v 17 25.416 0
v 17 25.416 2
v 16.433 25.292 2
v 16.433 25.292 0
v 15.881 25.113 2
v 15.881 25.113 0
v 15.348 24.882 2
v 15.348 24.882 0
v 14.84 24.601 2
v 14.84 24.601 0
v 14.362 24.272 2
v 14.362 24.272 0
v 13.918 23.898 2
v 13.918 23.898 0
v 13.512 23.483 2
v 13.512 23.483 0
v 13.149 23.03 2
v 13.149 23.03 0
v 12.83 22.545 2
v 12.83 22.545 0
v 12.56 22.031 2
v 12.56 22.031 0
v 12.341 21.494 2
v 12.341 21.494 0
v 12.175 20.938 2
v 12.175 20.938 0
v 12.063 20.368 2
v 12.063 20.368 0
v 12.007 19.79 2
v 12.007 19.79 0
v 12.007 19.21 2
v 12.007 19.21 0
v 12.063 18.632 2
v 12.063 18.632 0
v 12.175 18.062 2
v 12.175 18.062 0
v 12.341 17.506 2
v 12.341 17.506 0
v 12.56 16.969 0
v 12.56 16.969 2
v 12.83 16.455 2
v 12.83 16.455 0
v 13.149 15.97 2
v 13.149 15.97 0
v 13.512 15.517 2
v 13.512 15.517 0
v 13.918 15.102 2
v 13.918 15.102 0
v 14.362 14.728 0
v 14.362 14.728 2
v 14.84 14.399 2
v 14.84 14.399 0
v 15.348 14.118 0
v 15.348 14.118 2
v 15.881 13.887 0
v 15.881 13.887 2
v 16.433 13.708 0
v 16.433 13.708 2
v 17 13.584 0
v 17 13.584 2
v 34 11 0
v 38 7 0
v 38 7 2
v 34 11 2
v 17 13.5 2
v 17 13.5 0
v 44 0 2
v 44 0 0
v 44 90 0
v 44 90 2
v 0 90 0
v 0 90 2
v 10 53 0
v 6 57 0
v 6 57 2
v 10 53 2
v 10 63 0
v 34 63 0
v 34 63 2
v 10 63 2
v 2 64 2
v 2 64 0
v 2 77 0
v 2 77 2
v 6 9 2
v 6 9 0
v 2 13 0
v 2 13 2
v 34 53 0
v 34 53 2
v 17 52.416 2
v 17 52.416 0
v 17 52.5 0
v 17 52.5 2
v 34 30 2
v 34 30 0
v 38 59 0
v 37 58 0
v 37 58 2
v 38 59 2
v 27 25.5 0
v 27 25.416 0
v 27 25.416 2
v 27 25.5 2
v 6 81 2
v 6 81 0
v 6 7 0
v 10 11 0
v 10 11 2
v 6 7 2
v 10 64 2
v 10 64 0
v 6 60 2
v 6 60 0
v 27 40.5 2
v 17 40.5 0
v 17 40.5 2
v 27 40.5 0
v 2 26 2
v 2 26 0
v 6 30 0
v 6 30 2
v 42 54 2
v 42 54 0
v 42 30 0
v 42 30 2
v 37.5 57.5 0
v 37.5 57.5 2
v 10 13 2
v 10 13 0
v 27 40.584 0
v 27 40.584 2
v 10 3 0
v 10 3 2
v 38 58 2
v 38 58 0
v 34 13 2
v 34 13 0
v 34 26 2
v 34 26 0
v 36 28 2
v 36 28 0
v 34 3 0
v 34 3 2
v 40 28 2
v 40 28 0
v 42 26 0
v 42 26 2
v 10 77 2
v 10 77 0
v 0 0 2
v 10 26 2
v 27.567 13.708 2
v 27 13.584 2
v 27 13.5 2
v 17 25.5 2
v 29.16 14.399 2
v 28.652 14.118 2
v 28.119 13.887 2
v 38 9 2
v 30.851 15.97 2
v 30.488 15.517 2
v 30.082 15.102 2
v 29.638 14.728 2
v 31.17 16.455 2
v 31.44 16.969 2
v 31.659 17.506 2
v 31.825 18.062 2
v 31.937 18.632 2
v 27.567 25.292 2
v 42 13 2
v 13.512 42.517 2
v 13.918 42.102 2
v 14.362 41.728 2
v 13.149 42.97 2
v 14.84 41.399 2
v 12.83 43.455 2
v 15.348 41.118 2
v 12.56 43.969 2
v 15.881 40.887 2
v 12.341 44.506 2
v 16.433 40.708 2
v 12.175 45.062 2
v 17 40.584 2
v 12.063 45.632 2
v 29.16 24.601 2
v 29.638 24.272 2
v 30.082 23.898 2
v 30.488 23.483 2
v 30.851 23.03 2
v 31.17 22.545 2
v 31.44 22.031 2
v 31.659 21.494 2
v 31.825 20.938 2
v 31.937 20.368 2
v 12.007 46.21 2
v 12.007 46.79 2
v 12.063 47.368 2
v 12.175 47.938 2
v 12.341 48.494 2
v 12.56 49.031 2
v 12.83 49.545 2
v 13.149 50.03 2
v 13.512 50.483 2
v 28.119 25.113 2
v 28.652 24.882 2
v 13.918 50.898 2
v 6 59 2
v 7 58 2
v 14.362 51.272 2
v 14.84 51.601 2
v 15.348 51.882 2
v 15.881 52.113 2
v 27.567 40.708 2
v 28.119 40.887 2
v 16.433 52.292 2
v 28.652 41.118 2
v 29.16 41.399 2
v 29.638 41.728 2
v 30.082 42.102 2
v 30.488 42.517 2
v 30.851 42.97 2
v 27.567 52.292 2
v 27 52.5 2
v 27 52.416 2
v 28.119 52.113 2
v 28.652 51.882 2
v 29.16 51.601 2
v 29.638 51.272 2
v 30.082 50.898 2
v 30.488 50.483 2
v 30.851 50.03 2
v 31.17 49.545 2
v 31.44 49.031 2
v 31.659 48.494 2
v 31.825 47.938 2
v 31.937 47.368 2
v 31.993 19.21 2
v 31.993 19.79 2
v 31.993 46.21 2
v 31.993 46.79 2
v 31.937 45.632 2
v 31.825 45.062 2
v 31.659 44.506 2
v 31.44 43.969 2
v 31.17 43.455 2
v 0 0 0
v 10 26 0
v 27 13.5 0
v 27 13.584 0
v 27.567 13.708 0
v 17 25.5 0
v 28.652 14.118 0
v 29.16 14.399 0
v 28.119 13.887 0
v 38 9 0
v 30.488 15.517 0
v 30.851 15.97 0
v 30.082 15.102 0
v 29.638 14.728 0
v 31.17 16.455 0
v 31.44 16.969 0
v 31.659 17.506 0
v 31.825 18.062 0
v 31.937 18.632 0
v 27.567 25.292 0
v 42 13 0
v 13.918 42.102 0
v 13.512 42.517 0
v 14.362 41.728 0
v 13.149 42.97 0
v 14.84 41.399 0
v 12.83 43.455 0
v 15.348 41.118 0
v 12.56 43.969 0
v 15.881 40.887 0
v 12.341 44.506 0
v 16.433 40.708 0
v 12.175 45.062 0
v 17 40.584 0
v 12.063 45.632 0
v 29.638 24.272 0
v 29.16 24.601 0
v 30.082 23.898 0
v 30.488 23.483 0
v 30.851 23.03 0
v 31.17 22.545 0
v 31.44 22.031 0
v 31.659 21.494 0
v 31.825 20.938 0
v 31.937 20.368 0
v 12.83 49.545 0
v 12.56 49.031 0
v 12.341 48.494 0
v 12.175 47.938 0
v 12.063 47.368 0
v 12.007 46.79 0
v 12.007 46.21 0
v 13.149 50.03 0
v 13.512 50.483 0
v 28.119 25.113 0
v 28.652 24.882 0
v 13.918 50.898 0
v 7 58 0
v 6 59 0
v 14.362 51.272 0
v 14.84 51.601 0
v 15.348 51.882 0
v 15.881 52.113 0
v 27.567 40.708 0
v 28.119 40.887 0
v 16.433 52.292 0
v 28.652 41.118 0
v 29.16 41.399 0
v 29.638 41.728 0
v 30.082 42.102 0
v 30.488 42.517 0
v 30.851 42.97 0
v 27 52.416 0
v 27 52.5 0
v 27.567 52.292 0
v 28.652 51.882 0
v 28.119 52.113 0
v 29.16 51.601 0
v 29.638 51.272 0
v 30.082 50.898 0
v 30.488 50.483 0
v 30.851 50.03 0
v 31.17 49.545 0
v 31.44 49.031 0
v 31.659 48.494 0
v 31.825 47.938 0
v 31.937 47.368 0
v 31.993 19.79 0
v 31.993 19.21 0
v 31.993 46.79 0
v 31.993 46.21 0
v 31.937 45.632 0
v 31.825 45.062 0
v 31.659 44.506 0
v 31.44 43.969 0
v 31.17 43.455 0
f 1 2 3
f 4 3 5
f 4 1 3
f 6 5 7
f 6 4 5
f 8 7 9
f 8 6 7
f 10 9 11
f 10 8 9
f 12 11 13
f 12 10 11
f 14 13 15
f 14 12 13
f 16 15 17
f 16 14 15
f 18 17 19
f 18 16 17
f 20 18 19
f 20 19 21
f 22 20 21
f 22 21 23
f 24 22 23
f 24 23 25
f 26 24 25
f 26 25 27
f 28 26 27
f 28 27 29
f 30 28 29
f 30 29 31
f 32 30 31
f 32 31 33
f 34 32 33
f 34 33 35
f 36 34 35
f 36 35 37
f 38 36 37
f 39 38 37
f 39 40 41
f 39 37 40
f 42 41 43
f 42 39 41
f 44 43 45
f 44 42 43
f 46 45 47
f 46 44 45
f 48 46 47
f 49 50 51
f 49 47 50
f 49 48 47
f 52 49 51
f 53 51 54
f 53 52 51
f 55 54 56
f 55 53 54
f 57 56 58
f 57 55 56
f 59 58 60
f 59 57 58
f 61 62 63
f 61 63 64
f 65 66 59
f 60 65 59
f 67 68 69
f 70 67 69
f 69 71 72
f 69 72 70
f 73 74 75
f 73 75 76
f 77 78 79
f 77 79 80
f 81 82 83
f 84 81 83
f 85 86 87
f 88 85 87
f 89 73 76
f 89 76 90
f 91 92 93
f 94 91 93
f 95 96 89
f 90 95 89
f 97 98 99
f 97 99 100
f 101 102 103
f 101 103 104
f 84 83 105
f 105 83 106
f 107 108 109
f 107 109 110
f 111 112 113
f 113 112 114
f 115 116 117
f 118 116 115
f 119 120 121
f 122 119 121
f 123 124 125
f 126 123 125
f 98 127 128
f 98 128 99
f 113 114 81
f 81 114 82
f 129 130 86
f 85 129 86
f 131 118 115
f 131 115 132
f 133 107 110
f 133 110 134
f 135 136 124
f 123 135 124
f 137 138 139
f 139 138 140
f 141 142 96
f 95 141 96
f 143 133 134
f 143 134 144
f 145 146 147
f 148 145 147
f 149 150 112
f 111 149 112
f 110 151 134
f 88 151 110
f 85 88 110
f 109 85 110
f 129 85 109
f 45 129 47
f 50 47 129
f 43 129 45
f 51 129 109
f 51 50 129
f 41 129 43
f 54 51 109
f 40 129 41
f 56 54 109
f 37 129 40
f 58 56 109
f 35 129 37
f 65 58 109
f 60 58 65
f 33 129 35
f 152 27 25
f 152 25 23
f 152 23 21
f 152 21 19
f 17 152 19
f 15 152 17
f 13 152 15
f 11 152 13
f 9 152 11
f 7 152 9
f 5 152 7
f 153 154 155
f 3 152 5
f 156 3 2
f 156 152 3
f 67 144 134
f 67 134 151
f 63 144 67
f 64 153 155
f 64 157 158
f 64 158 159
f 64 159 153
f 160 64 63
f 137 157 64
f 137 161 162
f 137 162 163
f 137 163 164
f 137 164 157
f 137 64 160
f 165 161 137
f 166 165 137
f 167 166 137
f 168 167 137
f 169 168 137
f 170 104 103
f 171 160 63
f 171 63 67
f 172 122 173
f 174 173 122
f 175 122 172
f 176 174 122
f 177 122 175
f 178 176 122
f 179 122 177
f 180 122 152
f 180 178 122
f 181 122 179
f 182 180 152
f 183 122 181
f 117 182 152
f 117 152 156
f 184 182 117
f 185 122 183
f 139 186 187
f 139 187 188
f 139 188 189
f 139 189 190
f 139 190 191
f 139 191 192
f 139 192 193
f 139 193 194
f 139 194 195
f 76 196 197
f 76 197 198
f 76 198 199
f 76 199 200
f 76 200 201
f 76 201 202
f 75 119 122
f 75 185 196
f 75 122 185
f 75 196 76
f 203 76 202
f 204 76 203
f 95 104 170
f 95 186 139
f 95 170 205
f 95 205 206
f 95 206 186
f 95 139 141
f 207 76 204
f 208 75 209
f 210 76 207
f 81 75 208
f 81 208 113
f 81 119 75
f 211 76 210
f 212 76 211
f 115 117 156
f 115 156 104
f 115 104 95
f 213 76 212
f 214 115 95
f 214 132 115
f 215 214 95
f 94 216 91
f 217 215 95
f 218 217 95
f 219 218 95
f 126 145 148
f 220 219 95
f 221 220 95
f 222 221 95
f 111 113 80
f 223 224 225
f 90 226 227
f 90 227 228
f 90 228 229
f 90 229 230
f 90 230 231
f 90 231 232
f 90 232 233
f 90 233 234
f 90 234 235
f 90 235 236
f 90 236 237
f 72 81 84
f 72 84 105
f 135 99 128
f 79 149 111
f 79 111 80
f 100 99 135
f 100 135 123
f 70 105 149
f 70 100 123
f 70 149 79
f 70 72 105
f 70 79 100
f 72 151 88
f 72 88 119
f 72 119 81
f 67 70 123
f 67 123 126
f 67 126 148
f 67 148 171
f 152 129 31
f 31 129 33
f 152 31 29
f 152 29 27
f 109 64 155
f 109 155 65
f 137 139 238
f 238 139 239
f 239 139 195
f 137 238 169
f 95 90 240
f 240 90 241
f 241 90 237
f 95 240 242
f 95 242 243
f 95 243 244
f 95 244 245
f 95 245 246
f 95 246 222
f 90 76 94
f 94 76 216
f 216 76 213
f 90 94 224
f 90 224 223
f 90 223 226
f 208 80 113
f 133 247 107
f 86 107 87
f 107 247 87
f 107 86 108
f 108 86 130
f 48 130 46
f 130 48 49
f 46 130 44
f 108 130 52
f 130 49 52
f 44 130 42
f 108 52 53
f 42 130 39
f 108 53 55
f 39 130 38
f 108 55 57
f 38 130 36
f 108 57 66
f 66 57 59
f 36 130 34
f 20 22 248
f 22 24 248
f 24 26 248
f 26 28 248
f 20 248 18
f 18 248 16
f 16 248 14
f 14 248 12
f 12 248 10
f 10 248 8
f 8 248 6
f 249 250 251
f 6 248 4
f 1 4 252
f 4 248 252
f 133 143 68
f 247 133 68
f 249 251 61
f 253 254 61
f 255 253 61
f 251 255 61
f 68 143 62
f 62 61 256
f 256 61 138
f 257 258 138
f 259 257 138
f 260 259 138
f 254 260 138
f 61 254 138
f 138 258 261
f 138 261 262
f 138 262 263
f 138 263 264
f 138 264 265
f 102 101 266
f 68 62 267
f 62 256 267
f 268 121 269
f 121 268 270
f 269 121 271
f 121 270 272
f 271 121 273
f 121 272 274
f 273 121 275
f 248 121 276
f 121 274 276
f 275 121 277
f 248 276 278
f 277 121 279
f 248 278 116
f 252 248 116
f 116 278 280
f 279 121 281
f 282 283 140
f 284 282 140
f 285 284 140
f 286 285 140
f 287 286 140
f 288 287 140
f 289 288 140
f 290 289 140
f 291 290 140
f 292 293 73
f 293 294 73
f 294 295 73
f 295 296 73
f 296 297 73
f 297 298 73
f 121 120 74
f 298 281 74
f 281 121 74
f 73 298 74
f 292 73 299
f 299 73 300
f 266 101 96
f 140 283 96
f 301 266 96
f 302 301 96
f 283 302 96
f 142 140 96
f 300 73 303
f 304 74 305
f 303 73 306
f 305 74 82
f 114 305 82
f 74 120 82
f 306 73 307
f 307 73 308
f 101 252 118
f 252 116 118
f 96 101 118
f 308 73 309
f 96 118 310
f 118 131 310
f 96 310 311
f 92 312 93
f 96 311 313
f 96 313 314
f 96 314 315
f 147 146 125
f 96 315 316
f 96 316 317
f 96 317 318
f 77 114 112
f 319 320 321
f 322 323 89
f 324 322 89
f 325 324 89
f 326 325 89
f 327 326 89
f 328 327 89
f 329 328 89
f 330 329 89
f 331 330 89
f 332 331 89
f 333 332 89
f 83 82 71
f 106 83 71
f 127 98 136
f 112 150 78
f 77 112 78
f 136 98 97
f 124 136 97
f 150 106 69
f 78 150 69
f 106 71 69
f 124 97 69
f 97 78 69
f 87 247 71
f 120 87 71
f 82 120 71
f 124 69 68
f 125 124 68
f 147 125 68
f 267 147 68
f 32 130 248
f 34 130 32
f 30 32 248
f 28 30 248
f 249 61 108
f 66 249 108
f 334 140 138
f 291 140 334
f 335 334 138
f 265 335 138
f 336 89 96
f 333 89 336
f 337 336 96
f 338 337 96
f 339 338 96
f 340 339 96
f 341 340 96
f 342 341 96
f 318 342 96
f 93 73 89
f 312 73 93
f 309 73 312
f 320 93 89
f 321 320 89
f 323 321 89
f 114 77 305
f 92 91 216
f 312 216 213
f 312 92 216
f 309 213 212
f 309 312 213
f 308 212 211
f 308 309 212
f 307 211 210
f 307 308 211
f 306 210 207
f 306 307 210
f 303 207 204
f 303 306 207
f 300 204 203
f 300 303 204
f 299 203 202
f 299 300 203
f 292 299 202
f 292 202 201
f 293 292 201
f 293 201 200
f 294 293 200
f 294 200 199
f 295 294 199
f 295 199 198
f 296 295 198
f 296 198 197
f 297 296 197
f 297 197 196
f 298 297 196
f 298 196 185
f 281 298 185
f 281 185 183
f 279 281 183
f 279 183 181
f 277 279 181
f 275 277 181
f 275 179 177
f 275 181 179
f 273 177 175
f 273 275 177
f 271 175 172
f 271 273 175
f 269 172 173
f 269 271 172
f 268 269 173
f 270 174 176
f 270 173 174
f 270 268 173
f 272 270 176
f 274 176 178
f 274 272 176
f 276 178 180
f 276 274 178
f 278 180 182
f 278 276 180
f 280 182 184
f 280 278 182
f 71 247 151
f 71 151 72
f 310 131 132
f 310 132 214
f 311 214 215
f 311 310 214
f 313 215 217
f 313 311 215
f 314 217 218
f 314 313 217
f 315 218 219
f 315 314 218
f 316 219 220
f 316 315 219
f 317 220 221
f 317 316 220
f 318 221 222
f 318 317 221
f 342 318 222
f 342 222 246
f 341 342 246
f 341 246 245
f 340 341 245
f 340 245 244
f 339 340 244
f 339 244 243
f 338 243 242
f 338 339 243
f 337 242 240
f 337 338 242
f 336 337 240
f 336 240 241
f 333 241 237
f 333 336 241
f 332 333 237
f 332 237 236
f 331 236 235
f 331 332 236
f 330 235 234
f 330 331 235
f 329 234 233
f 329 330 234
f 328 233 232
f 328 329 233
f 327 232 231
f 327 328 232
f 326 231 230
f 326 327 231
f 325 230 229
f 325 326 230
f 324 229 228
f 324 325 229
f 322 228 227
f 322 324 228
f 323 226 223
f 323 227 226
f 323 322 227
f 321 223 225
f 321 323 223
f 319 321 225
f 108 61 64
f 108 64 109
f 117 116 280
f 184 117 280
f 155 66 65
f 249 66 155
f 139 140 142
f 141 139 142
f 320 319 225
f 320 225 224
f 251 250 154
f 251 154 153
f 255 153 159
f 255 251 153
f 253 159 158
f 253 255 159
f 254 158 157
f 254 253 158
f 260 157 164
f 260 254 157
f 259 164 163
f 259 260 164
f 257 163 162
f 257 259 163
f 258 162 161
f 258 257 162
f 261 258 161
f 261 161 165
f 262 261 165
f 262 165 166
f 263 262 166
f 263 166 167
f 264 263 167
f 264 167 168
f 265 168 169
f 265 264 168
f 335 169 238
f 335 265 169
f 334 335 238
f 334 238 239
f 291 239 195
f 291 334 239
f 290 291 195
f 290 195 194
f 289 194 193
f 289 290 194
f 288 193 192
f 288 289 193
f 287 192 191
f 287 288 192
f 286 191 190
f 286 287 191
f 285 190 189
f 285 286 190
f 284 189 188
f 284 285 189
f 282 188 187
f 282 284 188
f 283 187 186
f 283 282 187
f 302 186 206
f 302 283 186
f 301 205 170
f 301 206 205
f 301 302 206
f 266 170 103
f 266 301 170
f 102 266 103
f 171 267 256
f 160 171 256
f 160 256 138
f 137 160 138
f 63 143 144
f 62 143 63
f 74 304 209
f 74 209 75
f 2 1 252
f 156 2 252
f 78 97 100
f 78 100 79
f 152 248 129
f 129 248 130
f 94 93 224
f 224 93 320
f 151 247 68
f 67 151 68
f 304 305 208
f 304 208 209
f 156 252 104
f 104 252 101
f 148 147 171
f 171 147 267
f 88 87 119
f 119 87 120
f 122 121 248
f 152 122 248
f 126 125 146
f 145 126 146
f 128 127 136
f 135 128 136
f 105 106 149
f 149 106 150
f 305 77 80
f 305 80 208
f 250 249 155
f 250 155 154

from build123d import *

# Parameters (mm, degrees)
BOX007_W          = 10
BOX007_H          = 12
BOX007_DEPTH      = 10
CYLINDER003_R     = 6
CYLINDER003_DEPTH = 10
CYLINDER002_R     = 6
CYLINDER002_DEPTH = 10
BOX006_W          = 10
BOX006_H          = 12
BOX006_DEPTH      = 10
CYLINDER_R        = 6
CYLINDER_DEPTH    = 10
CYLINDER001_R     = 6
CYLINDER001_DEPTH = 10
EXTRUDE002_DEPTH  = 20
EXTRUDE003_DEPTH  = 20
EXTRUDE004_DEPTH  = 20
EXTRUDE005_DEPTH  = 20
EXTRUDE006_DEPTH  = 20
EXTRUDE001_DEPTH  = 20
EXTRUDE_DEPTH     = 20
BOX_W             = 44
BOX_H             = 90
BOX_DEPTH         = 2


with BuildPart() as cube007:
    # Box007 → Box007 (new body)
    with BuildSketch(Plane(origin=(17, 13.5, 0), x_dir=(1, 0, 0), z_dir=(0, 0, 1))):
        with Locations((5, 6)):
            Rectangle(BOX007_W, BOX007_H)
    extrude(amount=BOX007_DEPTH)


with BuildPart() as fusion003:
    # Cylinder003 → Cylinder003 (new body)
    with BuildSketch(Plane(origin=(18, 19.5, 0), x_dir=(1, 0, 0), z_dir=(0, 0, 1))):
        Circle(CYLINDER003_R)
    extrude(amount=CYLINDER003_DEPTH)

    # Fusion003: union Cube007
    add(cube007.part)


with BuildPart() as fusion002:
    # Cylinder002 → Cylinder002 (new body)
    with BuildSketch(Plane(origin=(26, 19.5, 0), x_dir=(1, 0, 0), z_dir=(0, 0, 1))):
        Circle(CYLINDER002_R)
    extrude(amount=CYLINDER002_DEPTH)

    # Fusion002: union Fusion003
    add(fusion003.part)


with BuildPart() as fusion002_1:
    # Fusion002 placement: moved
    add(fusion002.part.moved(Location((0, 27, 0))))


with BuildPart() as cube006:
    # Box006 → Box006 (new body)
    with BuildSketch(Plane(origin=(17, 13.5, 0), x_dir=(1, 0, 0), z_dir=(0, 0, 1))):
        with Locations((5, 6)):
            Rectangle(BOX006_W, BOX006_H)
    extrude(amount=BOX006_DEPTH)


with BuildPart() as fusion:
    # Cylinder → Cylinder (new body)
    with BuildSketch(Plane(origin=(18, 19.5, 0), x_dir=(1, 0, 0), z_dir=(0, 0, 1))):
        Circle(CYLINDER_R)
    extrude(amount=CYLINDER_DEPTH)

    # Fusion: union Cube006
    add(cube006.part)


with BuildPart() as fusion001:
    # Cylinder001 → Cylinder001 (new body)
    with BuildSketch(Plane(origin=(26, 19.5, 0), x_dir=(1, 0, 0), z_dir=(0, 0, 1))):
        Circle(CYLINDER001_R)
    extrude(amount=CYLINDER001_DEPTH)

    # Fusion001: union Fusion
    add(fusion.part)


with BuildPart() as extrude_c:
    # Sketch007 (on Face6 of Box005) → Extrude002 (new body)
    with BuildSketch(Plane.XY.offset(10)):
        Polygon((38, 30), (42, 26), (42, 13), (38, 9), (34, 13), (34, 26), align=None)
    extrude(amount=EXTRUDE002_DEPTH)


with BuildPart() as extrude_c_1:
    # Extrude002 placement: moved
    add(extrude_c.part.moved(Location((0, 0, -18))))


with BuildPart() as extrude_d:
    # Sketch004 (on Face6 of Box002) → Extrude003 (new body)
    with BuildSketch(Plane.XY.offset(10)):
        Polygon((10, 11), (6, 7), (10, 3), (34, 3), (38, 7), (34, 11), align=None)
    extrude(amount=EXTRUDE003_DEPTH)


with BuildPart() as extrude_d_1:
    # Extrude003 placement: moved
    add(extrude_d.part.moved(Location((0, 0, -20))))


with BuildPart() as extrude_e:
    # Sketch005 (on Face6 of Box003) → Extrude004 (new body)
    with BuildSketch(Plane.XY.offset(10)):
        Polygon((6, 30), (10, 26), (10, 13), (6, 9), (2, 13), (2, 26), align=None)
    extrude(amount=EXTRUDE004_DEPTH)


with BuildPart() as extrude_e_1:
    # Extrude004 placement: moved
    add(extrude_e.part.moved(Location((0, 0, -20))))


with BuildPart() as extrude_f:
    # Sketch (on Face6 of Box) → Extrude005 (new body)
    with BuildSketch(Plane.XY.offset(2)):
        Polygon((6, 81), (10, 77), (10, 64), (6, 60), (2, 64), (2, 77), align=None)
    extrude(amount=EXTRUDE005_DEPTH)


with BuildPart() as extrude_f_1:
    # Extrude005 placement: moved
    add(extrude_f.part.moved(Location((0, 0, -12))))


with BuildPart() as extrude_g:
    # Sketch002 (on Face6 of Box) → Extrude006 (new body)
    with BuildSketch(Plane.XY.offset(2)):
        Polygon((10, 61), (6, 57), (10, 53), (34, 53), (38, 57), (34, 61), align=None)
    extrude(amount=EXTRUDE006_DEPTH)


with BuildPart() as extrude_g_1:
    # Extrude006 placement: moved
    add(extrude_g.part.moved(Location((0, 0, -13))))


with BuildPart() as extrude_b:
    # Sketch006 (on Face6 of Box004) → Extrude001 (new body)
    with BuildSketch(Plane.XY.offset(10)):
        Polygon((38, 58), (42, 54), (42, 30), (38, 26), (34, 30), (34, 54), align=None)
    extrude(amount=EXTRUDE001_DEPTH)


with BuildPart() as extrude_b_1:
    # Extrude001 placement: moved
    add(extrude_b.part.moved(Location((0, 0, -17))))


with BuildPart() as extrude_a:
    # Sketch003 (on Face6 of Box001) → Extrude (new body)
    with BuildSketch(Plane.XY.offset(10)):
        Polygon((10, 63), (6, 59), (10, 55), (34, 55), (38, 59), (34, 63), align=None)
    extrude(amount=EXTRUDE_DEPTH)


with BuildPart() as extrude_a_1:
    # Extrude placement: moved
    add(extrude_a.part.moved(Location((0, 0, -14))))


with BuildPart() as plantilla_4mm:
    # Box → Box (new body)
    with BuildSketch(Plane.XY):
        with Locations((22, 45)):
            Rectangle(BOX_W, BOX_H)
    extrude(amount=BOX_DEPTH)

    # Cut: cut Extrude_A
    add(extrude_a_1.part, mode=Mode.SUBTRACT)

    # Cut001: cut Extrude_B
    add(extrude_b_1.part, mode=Mode.SUBTRACT)

    # Cut002: cut Extrude_G
    add(extrude_g_1.part, mode=Mode.SUBTRACT)

    # Cut003: cut Extrude_F
    add(extrude_f_1.part, mode=Mode.SUBTRACT)

    # Cut004: cut Extrude_E
    add(extrude_e_1.part, mode=Mode.SUBTRACT)

    # Cut005: cut Extrude_D
    add(extrude_d_1.part, mode=Mode.SUBTRACT)

    # Cut006: cut Extrude_C
    add(extrude_c_1.part, mode=Mode.SUBTRACT)

    # Cut007: cut Fusion001
    add(fusion001.part, mode=Mode.SUBTRACT)

    # Cut008: cut Fusion002
    add(fusion002_1.part, mode=Mode.SUBTRACT)


solid = plantilla_4mm.part
